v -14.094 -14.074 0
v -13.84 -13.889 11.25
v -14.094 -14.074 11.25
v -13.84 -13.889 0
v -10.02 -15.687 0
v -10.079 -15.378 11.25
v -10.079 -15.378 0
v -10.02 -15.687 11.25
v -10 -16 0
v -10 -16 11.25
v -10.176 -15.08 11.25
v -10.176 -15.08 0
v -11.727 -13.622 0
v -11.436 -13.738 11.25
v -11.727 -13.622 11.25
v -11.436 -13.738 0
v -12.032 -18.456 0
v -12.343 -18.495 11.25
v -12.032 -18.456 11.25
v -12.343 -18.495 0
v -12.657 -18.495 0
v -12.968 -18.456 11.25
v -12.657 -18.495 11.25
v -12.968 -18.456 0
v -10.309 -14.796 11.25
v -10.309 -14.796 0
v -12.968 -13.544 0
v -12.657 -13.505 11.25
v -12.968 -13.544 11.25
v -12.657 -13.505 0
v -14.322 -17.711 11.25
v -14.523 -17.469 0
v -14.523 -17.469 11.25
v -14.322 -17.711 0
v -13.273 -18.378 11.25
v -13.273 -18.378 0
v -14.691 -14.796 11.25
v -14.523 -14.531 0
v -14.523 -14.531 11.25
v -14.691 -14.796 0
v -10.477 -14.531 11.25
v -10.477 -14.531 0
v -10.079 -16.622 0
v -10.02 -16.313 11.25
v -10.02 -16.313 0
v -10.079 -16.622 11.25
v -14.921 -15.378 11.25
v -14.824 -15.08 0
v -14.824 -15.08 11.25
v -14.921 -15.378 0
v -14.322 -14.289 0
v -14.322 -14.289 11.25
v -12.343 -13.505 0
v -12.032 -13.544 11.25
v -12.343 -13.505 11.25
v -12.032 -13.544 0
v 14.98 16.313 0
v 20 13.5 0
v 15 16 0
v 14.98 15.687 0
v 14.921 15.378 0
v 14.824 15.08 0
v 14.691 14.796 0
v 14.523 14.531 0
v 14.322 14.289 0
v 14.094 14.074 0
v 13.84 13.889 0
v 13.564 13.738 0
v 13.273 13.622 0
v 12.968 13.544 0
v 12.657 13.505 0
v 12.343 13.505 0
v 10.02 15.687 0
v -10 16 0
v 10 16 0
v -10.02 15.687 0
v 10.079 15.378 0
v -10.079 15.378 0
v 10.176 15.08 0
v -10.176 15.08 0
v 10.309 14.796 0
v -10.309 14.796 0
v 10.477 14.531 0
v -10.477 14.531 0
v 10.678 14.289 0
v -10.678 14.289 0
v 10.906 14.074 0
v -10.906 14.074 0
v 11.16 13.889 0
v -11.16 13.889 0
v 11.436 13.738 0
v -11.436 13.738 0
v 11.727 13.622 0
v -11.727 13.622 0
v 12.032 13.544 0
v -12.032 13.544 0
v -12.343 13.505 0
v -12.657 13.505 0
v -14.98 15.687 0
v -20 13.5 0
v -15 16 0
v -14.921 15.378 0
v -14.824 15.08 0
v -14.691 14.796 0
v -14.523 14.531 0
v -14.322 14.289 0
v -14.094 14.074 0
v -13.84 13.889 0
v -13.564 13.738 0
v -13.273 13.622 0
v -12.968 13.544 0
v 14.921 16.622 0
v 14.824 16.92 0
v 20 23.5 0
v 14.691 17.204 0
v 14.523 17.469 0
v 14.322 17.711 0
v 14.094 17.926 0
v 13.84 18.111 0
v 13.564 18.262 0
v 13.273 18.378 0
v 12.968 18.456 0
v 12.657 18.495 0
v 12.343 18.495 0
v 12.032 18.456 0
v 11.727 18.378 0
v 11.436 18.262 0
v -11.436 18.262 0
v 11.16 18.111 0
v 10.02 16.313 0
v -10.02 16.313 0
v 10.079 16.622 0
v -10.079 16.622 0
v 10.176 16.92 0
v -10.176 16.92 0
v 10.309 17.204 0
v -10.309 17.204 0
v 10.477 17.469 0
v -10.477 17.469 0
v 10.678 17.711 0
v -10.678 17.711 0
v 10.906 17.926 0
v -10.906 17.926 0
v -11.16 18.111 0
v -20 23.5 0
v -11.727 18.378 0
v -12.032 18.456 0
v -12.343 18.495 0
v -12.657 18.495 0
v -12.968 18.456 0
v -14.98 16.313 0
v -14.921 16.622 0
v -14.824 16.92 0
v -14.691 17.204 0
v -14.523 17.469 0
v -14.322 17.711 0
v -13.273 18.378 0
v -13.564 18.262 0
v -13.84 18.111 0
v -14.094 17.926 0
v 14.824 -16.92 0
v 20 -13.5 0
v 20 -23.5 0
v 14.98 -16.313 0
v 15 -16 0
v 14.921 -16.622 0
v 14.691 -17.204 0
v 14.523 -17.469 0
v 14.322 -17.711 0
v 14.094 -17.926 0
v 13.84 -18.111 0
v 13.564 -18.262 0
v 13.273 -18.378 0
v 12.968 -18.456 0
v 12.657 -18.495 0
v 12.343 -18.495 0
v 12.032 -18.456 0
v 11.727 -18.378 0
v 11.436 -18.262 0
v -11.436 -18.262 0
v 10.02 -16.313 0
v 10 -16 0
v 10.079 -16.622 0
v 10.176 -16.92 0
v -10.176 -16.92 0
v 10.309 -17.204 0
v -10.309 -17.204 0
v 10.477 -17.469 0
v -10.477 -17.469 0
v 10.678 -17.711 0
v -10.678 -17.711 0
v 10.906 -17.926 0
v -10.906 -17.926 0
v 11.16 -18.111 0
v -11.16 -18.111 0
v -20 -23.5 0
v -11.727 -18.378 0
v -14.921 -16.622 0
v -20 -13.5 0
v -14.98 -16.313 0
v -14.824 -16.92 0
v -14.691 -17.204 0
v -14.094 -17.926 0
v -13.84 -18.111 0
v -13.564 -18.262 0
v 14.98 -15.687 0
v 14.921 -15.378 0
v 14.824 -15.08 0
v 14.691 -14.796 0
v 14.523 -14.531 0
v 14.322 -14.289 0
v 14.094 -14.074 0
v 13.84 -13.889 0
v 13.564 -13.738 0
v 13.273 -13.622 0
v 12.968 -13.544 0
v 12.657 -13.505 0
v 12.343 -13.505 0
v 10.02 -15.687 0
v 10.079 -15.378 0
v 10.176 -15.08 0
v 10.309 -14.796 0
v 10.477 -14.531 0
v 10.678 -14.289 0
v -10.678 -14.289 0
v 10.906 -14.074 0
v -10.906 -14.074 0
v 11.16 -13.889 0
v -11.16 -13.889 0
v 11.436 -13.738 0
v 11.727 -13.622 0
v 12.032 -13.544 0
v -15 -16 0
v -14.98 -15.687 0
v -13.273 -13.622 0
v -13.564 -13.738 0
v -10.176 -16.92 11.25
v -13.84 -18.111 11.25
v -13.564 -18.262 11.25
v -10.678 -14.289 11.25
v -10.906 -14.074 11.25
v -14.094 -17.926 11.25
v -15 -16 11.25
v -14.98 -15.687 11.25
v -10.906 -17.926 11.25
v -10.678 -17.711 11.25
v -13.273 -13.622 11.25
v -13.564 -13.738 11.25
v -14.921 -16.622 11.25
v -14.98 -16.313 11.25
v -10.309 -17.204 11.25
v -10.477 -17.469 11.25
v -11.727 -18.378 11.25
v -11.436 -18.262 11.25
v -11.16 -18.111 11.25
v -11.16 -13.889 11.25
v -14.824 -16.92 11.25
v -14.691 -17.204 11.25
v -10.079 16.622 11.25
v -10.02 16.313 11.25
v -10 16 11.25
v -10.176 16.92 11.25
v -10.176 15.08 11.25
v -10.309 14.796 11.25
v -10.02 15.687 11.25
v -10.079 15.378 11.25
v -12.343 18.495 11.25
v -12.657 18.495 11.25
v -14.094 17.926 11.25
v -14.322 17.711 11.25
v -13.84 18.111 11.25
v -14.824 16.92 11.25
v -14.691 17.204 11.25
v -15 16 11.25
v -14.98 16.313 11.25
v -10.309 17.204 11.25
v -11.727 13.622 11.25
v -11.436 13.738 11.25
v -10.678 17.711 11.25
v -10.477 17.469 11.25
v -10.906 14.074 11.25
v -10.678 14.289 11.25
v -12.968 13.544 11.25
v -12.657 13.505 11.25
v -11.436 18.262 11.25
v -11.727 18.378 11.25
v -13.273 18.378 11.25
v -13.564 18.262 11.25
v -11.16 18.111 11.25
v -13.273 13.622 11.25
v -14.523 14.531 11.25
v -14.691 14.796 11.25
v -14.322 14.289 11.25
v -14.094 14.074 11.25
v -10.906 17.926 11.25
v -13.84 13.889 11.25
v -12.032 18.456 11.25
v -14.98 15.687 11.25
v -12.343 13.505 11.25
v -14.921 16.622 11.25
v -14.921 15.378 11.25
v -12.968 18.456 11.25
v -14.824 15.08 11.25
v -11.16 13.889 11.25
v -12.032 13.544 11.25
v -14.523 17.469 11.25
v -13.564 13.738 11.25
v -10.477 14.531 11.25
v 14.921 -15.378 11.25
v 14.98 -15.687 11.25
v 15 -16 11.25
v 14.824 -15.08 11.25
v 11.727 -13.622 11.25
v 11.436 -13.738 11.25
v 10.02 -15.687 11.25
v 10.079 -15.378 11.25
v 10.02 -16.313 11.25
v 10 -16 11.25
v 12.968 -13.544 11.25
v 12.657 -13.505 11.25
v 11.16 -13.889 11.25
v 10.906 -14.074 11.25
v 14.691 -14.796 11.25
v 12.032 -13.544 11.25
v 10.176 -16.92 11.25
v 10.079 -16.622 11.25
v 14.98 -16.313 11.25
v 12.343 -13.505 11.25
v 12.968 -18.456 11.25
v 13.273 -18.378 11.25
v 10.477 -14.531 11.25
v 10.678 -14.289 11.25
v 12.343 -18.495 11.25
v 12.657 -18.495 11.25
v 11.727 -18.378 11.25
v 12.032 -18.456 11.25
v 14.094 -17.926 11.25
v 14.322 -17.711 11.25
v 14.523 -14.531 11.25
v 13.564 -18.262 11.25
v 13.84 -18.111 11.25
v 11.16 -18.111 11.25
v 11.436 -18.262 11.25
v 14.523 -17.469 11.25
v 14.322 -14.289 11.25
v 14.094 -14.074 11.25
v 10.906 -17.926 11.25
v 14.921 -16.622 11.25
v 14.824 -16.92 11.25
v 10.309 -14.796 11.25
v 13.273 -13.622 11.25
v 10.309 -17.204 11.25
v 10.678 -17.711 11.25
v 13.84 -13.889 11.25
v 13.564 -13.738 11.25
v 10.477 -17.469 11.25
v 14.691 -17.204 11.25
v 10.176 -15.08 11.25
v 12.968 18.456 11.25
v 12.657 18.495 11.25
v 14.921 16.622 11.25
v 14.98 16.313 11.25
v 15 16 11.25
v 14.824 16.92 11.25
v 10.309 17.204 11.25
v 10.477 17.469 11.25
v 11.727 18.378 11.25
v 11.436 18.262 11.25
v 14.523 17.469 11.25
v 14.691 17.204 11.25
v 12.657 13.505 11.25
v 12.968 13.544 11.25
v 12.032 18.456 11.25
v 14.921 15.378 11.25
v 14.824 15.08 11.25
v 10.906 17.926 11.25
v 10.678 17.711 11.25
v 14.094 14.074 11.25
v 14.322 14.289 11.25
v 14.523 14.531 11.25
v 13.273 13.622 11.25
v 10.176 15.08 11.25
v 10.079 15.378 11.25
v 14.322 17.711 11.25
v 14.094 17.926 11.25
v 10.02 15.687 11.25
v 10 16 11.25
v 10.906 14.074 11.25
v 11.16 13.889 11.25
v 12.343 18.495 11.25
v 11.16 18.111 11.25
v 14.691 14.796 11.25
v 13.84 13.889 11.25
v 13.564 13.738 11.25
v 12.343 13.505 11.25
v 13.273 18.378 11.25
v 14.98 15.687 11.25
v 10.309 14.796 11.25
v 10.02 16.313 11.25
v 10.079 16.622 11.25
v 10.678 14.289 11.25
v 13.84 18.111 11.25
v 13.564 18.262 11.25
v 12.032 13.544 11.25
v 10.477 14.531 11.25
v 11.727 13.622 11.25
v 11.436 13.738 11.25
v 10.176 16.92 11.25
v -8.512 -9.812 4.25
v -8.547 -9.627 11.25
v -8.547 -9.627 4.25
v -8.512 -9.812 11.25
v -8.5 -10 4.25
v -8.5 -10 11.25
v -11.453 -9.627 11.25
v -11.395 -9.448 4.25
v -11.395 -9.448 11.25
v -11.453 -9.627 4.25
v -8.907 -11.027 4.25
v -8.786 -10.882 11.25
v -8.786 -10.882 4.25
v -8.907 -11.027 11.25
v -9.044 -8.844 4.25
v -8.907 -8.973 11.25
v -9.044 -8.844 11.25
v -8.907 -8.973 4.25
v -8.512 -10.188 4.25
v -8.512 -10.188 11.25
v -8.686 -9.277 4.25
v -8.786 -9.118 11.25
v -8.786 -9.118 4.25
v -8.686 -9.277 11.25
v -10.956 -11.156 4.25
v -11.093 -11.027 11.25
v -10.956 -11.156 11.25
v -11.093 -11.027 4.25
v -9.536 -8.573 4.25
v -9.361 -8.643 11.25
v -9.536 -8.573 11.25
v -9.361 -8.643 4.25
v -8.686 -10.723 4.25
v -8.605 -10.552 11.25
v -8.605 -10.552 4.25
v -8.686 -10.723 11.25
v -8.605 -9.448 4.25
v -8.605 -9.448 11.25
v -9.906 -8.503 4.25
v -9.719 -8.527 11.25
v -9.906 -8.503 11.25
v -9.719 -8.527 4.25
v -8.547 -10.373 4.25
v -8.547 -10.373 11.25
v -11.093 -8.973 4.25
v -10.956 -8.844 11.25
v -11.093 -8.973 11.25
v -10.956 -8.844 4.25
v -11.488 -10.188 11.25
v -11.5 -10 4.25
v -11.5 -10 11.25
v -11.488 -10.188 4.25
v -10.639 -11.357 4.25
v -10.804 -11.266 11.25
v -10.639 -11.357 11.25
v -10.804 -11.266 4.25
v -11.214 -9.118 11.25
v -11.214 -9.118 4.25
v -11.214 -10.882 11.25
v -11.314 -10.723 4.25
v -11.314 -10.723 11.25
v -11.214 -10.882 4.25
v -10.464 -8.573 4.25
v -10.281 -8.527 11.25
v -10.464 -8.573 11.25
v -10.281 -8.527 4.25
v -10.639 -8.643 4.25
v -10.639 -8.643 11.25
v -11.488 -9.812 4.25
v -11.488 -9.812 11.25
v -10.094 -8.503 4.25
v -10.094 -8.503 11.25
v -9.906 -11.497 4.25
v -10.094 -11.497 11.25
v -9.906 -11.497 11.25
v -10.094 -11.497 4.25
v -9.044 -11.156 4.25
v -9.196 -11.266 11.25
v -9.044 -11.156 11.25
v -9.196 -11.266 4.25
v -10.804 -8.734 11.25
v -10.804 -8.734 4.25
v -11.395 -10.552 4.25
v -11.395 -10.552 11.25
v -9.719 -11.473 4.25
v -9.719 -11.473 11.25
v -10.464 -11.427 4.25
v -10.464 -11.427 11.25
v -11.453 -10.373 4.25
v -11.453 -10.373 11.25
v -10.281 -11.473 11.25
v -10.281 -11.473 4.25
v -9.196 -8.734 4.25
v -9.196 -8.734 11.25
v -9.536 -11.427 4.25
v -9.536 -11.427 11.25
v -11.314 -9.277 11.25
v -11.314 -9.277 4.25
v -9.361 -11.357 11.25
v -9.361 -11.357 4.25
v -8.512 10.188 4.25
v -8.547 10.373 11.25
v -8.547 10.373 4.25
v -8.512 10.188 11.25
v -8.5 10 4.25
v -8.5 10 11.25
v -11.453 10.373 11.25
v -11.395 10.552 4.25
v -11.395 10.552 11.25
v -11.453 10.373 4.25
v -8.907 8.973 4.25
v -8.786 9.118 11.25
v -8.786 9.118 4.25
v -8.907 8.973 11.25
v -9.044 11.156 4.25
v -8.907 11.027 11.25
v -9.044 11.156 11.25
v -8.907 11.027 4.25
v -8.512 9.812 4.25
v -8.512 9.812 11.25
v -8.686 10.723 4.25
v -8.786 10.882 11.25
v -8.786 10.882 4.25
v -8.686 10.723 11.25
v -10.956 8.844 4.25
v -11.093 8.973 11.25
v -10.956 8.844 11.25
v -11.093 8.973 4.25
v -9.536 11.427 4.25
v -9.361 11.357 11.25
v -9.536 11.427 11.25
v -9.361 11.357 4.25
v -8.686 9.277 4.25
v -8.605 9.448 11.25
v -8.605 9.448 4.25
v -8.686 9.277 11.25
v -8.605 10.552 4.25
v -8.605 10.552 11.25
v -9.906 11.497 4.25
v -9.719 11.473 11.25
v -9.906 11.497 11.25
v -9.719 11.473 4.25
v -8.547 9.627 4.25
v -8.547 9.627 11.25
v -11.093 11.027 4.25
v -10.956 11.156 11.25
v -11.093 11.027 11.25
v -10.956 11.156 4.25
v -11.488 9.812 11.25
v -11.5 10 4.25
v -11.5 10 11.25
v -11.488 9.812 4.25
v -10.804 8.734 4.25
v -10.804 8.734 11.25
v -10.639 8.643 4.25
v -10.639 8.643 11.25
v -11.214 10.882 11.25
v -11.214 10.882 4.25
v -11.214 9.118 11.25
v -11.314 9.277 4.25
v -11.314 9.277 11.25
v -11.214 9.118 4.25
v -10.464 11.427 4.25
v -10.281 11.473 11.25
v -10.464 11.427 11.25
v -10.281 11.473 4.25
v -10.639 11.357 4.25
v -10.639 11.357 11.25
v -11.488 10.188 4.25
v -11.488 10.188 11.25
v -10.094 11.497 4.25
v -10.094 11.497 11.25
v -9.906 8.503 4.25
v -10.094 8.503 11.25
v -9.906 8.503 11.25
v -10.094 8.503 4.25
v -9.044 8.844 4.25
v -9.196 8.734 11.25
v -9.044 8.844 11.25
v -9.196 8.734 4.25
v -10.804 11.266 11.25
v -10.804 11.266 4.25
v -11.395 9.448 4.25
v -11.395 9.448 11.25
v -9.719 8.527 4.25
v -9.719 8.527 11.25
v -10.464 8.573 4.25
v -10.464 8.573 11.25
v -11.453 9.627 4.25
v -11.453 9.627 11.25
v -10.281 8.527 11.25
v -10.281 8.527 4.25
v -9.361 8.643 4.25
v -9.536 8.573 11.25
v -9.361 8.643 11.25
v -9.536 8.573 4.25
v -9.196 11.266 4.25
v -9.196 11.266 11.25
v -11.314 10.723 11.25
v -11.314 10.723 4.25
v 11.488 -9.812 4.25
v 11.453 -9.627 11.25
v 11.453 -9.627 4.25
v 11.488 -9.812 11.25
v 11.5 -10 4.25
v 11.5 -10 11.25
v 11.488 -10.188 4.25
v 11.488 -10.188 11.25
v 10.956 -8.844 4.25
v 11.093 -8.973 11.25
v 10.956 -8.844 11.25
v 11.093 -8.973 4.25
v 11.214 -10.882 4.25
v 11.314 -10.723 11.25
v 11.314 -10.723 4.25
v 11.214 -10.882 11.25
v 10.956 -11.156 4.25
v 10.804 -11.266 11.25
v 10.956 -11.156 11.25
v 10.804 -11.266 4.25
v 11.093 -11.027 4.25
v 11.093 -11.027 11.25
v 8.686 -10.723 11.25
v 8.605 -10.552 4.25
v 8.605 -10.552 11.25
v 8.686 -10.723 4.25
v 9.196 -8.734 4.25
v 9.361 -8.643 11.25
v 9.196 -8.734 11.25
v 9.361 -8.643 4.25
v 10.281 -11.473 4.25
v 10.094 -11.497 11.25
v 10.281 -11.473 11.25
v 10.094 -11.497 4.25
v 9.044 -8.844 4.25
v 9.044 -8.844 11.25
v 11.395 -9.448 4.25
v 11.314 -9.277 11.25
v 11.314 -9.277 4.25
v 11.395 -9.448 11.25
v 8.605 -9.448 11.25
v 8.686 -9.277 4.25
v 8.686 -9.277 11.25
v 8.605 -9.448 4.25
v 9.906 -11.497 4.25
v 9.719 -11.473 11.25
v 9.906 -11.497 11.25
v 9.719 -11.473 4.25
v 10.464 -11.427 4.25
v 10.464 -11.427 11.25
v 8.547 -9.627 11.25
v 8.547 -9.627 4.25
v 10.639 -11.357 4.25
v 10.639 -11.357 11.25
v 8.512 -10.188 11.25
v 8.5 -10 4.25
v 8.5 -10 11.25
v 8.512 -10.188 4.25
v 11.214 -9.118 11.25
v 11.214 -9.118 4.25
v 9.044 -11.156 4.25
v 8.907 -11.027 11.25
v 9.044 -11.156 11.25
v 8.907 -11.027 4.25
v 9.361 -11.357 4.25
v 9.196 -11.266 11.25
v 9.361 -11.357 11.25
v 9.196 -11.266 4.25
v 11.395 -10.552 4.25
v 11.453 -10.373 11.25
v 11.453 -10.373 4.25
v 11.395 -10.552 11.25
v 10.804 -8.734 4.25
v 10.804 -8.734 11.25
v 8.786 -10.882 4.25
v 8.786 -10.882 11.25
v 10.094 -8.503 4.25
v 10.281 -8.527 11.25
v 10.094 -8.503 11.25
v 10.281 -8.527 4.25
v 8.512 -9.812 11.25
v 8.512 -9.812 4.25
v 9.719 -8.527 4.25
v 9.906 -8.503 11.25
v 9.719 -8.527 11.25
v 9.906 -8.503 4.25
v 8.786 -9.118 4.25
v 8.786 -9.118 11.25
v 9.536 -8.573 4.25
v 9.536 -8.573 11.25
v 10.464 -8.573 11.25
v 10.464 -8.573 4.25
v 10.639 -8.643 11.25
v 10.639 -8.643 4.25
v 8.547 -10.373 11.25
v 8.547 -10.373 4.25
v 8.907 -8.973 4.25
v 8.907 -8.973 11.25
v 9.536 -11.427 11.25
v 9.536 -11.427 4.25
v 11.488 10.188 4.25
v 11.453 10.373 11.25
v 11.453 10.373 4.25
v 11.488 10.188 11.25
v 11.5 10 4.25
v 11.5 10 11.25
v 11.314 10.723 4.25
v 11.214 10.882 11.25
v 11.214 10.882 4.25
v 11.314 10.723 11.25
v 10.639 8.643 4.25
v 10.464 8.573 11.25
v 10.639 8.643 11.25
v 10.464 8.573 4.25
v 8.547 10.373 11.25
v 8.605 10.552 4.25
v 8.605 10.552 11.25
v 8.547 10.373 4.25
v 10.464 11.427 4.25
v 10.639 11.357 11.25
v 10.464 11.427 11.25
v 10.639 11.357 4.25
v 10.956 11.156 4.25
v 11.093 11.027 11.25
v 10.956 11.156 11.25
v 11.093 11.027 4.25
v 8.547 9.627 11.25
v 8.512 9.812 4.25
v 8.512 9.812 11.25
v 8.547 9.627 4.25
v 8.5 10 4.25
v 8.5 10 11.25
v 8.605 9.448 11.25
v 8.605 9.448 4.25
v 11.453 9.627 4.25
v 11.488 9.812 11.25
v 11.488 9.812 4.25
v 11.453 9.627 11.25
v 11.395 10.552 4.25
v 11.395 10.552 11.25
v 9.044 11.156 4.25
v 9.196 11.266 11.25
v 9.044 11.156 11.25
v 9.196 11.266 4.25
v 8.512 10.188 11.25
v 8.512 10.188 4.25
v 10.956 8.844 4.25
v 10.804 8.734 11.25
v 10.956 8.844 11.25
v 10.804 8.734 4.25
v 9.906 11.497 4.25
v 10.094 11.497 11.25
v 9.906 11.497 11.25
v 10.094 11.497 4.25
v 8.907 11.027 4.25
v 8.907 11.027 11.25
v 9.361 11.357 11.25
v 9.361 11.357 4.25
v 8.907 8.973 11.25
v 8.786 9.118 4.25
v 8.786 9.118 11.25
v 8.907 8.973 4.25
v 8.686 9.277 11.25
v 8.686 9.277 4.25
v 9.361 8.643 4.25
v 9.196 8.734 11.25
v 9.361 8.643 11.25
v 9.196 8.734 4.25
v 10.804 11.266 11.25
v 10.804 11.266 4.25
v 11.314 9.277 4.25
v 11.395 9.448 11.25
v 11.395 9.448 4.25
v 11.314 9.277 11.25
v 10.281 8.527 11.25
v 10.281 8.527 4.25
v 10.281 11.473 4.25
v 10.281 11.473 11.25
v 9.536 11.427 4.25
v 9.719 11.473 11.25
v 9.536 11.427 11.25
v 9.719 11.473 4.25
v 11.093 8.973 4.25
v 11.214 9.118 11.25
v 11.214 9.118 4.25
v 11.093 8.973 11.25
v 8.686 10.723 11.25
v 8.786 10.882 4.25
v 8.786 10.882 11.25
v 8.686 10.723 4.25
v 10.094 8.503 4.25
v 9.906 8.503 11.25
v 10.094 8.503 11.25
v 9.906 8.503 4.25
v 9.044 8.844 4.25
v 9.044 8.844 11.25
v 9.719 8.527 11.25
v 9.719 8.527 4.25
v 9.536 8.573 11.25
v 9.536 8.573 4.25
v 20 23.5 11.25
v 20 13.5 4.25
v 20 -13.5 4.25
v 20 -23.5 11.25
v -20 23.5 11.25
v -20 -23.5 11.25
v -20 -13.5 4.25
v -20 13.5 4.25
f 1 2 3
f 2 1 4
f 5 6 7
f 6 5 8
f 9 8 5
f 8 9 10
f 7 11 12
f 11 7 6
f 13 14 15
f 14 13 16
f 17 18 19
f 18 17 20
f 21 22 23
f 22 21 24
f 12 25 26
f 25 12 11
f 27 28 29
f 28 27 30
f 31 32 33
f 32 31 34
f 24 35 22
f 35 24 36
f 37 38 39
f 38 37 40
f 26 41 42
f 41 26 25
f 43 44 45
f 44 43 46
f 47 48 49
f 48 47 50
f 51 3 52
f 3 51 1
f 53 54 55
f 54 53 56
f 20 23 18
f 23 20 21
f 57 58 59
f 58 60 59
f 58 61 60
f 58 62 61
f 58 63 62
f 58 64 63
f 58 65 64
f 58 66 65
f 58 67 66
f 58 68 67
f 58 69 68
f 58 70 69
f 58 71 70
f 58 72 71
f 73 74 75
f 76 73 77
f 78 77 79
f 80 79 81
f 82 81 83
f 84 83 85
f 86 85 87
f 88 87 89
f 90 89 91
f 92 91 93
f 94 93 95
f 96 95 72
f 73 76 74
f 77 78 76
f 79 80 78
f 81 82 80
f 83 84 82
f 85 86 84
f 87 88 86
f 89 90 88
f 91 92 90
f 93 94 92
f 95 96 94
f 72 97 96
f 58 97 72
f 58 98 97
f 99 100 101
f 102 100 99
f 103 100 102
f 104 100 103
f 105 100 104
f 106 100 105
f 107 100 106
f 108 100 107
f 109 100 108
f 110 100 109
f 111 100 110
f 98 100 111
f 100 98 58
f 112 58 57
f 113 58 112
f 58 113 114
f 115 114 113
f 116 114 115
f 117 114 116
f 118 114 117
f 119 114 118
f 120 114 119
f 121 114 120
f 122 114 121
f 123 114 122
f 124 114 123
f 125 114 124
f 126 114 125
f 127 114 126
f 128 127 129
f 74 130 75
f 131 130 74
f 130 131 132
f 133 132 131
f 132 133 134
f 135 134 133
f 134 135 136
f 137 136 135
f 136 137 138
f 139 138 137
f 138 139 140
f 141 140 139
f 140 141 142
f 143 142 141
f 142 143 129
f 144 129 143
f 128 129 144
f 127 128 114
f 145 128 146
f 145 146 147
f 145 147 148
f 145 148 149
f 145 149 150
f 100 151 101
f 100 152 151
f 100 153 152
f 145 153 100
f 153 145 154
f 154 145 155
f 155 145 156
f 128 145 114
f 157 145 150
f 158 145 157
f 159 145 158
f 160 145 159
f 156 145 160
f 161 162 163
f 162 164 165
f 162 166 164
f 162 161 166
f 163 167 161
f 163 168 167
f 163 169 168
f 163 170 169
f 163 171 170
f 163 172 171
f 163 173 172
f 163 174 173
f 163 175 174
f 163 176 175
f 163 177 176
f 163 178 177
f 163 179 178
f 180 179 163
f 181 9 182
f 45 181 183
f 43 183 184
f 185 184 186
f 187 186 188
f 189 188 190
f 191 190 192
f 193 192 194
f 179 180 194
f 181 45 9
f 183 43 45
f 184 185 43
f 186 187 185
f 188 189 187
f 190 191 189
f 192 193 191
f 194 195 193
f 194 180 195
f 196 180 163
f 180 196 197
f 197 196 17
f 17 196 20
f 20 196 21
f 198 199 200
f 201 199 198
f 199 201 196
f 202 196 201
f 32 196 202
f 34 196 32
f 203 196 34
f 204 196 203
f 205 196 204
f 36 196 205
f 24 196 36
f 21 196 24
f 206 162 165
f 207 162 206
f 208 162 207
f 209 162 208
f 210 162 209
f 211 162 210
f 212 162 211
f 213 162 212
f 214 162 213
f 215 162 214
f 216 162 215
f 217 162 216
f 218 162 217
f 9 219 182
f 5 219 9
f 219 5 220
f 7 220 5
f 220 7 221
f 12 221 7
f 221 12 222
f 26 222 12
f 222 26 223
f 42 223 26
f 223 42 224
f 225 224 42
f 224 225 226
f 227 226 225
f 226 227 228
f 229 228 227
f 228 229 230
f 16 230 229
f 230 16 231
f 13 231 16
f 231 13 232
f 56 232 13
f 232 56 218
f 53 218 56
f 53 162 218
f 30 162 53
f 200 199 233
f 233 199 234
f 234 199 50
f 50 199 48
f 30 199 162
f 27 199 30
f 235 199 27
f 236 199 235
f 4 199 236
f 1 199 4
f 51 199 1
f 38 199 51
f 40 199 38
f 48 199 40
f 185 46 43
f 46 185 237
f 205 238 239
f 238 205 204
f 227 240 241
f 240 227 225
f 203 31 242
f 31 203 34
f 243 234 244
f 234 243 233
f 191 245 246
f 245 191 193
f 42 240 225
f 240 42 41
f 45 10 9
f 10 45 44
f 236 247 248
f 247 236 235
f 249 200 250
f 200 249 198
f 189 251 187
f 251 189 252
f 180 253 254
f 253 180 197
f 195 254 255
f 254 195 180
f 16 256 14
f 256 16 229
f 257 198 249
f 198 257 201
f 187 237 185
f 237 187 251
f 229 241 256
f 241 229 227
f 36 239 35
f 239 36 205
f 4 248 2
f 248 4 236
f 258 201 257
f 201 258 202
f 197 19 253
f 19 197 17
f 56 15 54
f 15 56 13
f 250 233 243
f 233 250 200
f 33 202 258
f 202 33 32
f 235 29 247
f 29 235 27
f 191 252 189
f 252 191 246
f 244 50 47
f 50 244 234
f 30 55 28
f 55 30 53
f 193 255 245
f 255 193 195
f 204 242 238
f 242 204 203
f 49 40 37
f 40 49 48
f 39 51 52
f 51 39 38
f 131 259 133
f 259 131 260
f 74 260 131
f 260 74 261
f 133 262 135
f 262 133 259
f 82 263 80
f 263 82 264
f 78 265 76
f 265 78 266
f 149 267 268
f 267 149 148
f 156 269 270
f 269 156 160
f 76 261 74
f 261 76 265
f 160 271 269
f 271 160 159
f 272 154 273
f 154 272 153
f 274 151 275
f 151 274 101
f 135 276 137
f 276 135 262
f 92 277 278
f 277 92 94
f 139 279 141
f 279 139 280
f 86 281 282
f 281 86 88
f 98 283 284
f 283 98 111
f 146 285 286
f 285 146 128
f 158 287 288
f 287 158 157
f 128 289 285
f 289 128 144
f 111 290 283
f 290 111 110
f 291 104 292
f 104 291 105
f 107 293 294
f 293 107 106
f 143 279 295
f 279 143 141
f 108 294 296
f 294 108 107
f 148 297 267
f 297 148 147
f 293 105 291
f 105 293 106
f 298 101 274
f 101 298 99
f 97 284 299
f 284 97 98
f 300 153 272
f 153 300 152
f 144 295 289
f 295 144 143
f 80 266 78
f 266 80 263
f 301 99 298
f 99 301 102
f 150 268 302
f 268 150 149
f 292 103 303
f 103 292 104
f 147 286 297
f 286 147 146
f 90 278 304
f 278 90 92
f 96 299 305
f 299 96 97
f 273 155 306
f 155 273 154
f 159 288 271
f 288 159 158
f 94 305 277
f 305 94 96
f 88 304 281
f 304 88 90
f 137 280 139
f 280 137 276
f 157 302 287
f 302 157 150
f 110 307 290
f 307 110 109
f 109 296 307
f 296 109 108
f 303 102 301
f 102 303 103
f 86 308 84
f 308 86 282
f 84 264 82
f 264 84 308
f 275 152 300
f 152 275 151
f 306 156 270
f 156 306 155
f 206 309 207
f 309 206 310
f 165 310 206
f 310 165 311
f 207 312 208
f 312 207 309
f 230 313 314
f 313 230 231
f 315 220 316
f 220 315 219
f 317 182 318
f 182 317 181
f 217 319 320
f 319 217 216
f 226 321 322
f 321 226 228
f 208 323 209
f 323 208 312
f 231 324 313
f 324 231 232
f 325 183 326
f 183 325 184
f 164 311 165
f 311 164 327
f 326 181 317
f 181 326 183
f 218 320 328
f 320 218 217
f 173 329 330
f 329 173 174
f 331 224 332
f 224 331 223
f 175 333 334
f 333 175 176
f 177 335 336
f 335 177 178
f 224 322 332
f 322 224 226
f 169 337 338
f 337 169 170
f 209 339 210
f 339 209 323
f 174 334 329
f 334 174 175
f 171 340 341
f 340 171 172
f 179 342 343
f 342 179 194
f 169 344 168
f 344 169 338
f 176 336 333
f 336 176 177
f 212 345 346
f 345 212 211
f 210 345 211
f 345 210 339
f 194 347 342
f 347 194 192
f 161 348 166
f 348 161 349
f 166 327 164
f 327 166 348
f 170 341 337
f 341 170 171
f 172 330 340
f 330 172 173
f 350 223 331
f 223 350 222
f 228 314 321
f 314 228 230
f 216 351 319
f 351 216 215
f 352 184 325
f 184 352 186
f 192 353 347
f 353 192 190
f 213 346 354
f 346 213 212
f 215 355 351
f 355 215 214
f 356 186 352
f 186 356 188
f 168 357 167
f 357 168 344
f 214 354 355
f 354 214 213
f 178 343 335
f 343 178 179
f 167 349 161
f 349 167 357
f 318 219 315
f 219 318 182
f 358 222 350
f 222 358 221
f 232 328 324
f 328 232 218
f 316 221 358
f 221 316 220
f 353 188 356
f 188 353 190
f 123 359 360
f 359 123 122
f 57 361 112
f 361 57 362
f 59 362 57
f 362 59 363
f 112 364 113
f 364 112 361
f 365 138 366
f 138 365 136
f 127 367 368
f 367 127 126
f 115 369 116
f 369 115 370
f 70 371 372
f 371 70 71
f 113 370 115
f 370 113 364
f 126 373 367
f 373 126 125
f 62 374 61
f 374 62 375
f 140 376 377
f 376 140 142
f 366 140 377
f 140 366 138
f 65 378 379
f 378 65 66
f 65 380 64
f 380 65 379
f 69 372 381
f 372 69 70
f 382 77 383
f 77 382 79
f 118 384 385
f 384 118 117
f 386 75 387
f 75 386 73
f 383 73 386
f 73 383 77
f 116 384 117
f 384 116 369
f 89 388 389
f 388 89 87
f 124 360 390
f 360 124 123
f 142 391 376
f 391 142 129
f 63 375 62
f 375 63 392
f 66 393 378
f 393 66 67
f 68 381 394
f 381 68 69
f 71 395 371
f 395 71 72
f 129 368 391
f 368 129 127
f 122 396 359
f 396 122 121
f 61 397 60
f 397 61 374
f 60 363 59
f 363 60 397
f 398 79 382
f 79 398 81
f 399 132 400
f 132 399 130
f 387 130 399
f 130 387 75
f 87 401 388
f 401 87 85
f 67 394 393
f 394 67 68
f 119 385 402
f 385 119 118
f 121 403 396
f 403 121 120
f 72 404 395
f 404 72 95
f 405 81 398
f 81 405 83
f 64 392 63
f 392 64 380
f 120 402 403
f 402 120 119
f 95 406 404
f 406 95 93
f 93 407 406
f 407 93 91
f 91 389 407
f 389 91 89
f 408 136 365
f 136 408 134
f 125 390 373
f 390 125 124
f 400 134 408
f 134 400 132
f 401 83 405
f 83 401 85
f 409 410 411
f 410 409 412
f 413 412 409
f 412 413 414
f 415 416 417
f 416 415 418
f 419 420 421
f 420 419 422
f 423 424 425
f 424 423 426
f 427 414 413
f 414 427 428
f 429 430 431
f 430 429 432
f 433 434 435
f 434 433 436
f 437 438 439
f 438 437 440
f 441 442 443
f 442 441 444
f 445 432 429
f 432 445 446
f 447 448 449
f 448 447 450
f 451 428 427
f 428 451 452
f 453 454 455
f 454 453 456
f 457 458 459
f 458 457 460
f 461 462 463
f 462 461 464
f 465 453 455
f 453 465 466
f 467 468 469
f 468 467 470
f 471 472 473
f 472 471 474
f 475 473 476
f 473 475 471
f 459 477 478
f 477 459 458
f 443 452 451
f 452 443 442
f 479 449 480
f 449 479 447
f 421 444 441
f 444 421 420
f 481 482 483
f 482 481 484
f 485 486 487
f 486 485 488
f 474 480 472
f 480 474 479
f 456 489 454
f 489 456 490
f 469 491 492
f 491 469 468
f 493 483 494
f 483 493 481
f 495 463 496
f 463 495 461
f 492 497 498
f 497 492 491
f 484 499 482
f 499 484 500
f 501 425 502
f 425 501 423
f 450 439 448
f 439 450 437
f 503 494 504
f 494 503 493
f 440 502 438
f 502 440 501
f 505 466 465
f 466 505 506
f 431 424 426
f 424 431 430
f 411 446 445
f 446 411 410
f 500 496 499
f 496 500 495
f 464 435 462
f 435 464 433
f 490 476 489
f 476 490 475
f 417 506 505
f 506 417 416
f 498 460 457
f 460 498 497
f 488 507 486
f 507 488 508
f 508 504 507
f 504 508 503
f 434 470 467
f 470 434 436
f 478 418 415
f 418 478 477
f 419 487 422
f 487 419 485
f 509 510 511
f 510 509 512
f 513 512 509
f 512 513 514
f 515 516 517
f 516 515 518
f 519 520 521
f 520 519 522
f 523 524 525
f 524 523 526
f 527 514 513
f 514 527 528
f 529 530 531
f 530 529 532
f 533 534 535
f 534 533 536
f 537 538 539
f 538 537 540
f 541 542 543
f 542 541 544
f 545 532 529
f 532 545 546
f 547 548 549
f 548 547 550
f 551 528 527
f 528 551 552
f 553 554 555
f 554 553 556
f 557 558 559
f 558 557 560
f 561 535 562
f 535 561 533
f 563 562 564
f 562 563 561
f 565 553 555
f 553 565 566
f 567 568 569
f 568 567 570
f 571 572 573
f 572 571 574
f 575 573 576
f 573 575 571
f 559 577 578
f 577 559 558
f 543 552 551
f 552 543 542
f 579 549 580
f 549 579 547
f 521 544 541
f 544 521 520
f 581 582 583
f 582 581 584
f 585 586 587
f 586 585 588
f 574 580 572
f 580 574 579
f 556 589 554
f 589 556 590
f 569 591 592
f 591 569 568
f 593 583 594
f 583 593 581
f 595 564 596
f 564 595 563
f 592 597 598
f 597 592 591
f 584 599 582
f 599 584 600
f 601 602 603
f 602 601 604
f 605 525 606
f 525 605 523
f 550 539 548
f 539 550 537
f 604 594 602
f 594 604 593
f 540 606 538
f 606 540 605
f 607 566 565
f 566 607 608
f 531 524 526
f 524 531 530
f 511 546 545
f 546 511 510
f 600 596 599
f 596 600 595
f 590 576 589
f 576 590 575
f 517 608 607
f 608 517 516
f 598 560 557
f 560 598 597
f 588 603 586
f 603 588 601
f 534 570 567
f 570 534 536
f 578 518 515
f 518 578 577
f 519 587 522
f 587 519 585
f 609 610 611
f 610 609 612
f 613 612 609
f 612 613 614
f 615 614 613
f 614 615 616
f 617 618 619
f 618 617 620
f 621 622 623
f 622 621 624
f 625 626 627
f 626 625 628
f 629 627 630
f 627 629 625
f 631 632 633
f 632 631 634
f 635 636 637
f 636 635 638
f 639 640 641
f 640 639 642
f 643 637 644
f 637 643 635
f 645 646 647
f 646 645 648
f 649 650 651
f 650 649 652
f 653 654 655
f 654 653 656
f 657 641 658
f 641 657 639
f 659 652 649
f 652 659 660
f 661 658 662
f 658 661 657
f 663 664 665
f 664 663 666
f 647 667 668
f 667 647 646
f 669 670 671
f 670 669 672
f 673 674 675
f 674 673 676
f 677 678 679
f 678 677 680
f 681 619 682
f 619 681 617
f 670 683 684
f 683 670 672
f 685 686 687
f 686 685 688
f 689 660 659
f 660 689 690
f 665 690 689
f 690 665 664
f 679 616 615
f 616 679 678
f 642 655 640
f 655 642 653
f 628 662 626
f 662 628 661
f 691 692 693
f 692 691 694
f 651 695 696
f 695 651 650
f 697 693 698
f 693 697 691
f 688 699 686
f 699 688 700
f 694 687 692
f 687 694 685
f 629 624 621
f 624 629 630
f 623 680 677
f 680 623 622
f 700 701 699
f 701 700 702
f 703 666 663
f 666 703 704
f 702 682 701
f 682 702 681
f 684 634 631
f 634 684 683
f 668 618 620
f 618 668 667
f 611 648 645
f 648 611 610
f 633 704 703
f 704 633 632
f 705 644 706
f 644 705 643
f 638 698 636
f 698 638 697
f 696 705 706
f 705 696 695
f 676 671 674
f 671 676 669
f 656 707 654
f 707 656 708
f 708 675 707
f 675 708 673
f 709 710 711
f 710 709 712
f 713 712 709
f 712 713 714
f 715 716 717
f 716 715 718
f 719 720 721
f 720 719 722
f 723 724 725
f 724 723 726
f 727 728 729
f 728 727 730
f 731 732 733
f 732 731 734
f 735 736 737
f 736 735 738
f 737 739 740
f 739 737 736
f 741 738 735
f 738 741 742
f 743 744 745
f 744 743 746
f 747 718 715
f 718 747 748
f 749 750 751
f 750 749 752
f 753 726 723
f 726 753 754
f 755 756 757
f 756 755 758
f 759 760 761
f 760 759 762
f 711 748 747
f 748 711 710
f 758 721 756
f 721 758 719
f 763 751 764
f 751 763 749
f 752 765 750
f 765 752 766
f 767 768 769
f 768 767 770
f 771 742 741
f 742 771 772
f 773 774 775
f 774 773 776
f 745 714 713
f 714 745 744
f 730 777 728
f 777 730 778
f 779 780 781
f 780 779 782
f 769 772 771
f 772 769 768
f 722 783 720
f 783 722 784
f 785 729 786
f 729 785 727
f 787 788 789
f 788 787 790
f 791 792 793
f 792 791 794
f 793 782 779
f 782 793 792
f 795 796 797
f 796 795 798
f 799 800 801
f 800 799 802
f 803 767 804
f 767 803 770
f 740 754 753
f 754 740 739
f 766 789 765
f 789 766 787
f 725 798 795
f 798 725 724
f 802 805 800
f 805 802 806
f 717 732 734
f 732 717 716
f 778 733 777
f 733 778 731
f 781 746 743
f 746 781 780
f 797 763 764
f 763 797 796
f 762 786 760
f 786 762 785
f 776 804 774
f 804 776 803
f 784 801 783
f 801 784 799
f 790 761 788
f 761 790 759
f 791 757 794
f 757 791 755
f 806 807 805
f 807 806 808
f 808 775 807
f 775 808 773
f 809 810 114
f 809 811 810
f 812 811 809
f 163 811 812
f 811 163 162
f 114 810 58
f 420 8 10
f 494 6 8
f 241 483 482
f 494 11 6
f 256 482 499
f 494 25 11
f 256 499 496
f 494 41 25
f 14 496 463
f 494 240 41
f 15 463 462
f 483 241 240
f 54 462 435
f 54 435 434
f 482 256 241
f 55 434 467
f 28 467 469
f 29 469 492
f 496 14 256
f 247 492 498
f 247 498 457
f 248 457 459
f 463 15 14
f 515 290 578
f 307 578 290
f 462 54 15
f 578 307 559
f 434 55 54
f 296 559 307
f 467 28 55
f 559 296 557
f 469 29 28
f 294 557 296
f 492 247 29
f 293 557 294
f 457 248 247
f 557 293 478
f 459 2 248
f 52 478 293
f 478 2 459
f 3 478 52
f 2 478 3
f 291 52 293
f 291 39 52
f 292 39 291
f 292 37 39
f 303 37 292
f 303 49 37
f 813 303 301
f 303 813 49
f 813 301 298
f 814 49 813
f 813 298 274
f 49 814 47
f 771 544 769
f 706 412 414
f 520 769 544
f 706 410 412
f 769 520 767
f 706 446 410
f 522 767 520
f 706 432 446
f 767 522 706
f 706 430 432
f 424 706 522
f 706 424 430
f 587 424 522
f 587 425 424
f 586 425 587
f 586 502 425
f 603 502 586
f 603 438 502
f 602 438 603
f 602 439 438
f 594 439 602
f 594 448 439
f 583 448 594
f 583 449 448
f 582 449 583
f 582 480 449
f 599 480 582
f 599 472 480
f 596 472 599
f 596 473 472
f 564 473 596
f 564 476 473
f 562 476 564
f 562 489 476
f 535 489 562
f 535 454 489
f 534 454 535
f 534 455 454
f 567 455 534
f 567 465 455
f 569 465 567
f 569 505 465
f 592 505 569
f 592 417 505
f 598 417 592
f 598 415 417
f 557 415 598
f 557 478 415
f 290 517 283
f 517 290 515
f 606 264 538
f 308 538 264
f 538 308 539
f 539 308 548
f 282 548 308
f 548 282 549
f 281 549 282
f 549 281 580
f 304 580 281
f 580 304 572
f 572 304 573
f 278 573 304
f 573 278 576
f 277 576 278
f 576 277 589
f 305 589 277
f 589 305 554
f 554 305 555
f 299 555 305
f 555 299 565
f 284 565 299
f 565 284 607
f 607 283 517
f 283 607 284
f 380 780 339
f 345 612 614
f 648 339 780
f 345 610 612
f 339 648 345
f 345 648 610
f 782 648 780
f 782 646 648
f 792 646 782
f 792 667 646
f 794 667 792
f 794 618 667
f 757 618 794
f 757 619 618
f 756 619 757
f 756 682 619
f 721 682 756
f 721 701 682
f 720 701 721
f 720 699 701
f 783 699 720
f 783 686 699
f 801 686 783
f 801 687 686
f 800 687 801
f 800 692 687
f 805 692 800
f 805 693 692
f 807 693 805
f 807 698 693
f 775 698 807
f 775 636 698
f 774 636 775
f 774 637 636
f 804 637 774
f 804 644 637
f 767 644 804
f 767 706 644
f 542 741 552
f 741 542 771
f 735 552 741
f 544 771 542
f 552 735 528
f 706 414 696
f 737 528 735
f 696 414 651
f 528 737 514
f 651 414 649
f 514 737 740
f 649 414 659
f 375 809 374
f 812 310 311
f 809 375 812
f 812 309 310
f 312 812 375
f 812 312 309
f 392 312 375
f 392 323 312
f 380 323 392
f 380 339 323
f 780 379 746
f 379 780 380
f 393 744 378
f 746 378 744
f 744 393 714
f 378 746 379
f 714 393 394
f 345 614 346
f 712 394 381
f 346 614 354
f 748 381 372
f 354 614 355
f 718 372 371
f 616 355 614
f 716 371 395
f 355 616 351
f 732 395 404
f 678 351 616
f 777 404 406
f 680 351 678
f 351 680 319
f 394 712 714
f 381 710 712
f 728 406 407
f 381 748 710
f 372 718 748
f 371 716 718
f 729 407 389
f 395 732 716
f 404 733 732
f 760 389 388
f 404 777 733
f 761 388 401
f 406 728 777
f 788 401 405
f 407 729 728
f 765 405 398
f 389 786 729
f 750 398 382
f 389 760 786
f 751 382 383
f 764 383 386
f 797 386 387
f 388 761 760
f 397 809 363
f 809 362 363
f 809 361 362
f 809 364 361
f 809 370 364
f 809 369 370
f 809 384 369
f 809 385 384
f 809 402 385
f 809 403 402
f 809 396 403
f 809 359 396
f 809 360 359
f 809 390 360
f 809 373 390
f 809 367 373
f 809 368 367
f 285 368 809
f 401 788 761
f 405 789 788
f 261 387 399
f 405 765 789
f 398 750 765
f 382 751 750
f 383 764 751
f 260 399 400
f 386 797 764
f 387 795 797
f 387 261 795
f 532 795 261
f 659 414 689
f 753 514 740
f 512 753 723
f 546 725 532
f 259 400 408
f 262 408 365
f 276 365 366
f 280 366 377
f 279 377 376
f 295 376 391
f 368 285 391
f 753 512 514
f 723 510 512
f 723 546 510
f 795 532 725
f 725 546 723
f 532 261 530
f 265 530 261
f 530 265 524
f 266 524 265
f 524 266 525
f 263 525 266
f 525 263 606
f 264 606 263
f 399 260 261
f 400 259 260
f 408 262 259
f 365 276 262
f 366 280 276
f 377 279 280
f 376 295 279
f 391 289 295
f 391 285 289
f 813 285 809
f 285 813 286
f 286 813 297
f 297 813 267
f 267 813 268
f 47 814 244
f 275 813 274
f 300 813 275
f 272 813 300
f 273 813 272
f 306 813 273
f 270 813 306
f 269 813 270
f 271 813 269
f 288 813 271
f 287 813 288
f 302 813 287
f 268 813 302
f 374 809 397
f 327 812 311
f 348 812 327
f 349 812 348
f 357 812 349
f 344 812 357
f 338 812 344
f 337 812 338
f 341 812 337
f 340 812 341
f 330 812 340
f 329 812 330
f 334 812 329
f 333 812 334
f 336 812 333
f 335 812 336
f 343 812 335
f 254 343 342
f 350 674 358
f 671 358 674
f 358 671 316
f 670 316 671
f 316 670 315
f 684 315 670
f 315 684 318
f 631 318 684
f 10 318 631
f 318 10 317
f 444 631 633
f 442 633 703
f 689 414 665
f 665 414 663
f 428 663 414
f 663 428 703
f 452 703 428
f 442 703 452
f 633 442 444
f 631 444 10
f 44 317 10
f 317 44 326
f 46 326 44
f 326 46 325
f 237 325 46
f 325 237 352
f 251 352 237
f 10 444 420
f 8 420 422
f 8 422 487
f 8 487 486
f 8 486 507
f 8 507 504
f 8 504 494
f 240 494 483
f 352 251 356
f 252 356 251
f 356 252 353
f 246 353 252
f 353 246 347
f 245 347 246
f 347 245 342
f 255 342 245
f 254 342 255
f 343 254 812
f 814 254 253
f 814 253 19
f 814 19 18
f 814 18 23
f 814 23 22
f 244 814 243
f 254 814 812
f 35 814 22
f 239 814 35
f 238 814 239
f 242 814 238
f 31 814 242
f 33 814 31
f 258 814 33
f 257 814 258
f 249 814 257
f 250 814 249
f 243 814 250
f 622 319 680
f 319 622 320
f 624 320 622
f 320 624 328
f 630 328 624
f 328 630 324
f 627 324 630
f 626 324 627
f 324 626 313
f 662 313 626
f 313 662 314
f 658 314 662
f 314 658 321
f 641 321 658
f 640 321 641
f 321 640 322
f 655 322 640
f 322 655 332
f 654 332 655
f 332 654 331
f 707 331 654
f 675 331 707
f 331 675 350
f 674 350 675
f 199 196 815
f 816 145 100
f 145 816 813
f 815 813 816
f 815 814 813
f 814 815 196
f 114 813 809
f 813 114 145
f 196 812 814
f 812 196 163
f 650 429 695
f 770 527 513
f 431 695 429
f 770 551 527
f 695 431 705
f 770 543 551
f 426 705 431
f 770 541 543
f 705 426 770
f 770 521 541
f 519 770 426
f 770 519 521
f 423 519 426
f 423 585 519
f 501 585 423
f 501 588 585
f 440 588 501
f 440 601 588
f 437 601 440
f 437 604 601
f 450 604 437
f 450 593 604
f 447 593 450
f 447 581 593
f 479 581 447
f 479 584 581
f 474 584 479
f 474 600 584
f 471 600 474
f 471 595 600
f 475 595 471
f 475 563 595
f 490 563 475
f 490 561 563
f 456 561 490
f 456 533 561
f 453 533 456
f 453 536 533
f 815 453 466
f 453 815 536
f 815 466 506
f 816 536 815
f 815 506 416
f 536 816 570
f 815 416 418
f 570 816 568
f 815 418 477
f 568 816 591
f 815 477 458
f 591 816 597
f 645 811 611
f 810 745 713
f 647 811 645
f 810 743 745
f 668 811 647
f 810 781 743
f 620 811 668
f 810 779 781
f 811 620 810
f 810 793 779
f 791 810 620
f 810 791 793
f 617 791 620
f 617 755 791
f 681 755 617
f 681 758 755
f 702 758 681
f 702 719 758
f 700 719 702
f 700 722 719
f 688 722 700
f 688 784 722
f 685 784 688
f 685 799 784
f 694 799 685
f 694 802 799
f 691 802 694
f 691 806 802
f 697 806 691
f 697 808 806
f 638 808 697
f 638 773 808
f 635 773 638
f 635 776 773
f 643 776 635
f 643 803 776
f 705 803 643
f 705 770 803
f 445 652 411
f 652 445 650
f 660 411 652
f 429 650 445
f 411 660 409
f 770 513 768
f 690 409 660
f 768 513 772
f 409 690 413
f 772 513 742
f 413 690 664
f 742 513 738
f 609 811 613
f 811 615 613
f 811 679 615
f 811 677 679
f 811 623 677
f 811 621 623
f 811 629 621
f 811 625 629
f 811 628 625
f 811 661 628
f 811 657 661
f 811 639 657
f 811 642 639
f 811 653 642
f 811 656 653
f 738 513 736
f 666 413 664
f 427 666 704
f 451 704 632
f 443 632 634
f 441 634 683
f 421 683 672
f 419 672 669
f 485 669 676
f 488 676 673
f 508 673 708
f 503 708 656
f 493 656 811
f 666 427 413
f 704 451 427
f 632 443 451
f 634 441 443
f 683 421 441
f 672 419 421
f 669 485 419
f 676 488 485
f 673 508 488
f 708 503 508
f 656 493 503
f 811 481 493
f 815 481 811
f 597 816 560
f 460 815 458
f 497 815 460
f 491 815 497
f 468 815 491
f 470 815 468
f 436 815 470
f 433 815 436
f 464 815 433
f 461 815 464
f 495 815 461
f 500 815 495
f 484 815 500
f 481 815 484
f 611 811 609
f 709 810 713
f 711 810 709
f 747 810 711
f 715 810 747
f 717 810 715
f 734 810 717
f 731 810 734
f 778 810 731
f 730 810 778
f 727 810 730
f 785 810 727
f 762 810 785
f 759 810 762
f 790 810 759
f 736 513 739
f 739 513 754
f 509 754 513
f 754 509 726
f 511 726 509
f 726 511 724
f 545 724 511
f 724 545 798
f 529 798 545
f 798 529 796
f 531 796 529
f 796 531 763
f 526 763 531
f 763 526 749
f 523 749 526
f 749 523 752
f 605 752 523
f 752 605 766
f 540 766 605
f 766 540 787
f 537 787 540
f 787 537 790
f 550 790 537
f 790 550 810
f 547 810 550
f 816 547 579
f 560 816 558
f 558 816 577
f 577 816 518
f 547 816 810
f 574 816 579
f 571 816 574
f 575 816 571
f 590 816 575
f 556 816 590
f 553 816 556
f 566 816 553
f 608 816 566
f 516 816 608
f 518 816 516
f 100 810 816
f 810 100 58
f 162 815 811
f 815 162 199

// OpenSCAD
$fn = 50;

bearing_block_screw_x_distance = 20;
bearing_block_screw_y_distance = 20;
bearing_block_height = 27;
bearing_block_width = 46;
bearing_block_thickness = 4.25; // well, this is what we'll use
bearing_block_screw_diameter = 3;

carriage_screw_x_distance = 25;
carriage_screw_y_distance = 32;
carriage_screw_diameter = 5;

adapter_width = carriage_screw_x_distance + carriage_screw_diameter + 10;
adapter_height = carriage_screw_y_distance + carriage_screw_diameter + 10;
adapter_thickness = bearing_block_thickness + 7;

module bearing_block() {
    translate([0, 0, bearing_block_thickness/2])
    cube([bearing_block_width, bearing_block_height, bearing_block_thickness], center = true);
}

module rail_adapter() {
    difference() {
        union() {
            translate([0, 0, adapter_thickness/2])
            cube([adapter_width, adapter_height, adapter_thickness], center=true);
        }
        
        bearing_block();
        
        for (x = [-carriage_screw_x_distance/2, +carriage_screw_x_distance/2])
        for (y = [-carriage_screw_y_distance/2, +carriage_screw_y_distance/2])
        translate([x, y, 0])
        cylinder(h=20, d=carriage_screw_diameter);
        
        for (x = [-bearing_block_screw_x_distance/2, +bearing_block_screw_x_distance/2])
        for (y = [-bearing_block_screw_y_distance/2, +bearing_block_screw_y_distance/2])
        translate([x, y, 0])
        cylinder(h=20, d=bearing_block_screw_diameter);
    }
}

rail_adapter();
